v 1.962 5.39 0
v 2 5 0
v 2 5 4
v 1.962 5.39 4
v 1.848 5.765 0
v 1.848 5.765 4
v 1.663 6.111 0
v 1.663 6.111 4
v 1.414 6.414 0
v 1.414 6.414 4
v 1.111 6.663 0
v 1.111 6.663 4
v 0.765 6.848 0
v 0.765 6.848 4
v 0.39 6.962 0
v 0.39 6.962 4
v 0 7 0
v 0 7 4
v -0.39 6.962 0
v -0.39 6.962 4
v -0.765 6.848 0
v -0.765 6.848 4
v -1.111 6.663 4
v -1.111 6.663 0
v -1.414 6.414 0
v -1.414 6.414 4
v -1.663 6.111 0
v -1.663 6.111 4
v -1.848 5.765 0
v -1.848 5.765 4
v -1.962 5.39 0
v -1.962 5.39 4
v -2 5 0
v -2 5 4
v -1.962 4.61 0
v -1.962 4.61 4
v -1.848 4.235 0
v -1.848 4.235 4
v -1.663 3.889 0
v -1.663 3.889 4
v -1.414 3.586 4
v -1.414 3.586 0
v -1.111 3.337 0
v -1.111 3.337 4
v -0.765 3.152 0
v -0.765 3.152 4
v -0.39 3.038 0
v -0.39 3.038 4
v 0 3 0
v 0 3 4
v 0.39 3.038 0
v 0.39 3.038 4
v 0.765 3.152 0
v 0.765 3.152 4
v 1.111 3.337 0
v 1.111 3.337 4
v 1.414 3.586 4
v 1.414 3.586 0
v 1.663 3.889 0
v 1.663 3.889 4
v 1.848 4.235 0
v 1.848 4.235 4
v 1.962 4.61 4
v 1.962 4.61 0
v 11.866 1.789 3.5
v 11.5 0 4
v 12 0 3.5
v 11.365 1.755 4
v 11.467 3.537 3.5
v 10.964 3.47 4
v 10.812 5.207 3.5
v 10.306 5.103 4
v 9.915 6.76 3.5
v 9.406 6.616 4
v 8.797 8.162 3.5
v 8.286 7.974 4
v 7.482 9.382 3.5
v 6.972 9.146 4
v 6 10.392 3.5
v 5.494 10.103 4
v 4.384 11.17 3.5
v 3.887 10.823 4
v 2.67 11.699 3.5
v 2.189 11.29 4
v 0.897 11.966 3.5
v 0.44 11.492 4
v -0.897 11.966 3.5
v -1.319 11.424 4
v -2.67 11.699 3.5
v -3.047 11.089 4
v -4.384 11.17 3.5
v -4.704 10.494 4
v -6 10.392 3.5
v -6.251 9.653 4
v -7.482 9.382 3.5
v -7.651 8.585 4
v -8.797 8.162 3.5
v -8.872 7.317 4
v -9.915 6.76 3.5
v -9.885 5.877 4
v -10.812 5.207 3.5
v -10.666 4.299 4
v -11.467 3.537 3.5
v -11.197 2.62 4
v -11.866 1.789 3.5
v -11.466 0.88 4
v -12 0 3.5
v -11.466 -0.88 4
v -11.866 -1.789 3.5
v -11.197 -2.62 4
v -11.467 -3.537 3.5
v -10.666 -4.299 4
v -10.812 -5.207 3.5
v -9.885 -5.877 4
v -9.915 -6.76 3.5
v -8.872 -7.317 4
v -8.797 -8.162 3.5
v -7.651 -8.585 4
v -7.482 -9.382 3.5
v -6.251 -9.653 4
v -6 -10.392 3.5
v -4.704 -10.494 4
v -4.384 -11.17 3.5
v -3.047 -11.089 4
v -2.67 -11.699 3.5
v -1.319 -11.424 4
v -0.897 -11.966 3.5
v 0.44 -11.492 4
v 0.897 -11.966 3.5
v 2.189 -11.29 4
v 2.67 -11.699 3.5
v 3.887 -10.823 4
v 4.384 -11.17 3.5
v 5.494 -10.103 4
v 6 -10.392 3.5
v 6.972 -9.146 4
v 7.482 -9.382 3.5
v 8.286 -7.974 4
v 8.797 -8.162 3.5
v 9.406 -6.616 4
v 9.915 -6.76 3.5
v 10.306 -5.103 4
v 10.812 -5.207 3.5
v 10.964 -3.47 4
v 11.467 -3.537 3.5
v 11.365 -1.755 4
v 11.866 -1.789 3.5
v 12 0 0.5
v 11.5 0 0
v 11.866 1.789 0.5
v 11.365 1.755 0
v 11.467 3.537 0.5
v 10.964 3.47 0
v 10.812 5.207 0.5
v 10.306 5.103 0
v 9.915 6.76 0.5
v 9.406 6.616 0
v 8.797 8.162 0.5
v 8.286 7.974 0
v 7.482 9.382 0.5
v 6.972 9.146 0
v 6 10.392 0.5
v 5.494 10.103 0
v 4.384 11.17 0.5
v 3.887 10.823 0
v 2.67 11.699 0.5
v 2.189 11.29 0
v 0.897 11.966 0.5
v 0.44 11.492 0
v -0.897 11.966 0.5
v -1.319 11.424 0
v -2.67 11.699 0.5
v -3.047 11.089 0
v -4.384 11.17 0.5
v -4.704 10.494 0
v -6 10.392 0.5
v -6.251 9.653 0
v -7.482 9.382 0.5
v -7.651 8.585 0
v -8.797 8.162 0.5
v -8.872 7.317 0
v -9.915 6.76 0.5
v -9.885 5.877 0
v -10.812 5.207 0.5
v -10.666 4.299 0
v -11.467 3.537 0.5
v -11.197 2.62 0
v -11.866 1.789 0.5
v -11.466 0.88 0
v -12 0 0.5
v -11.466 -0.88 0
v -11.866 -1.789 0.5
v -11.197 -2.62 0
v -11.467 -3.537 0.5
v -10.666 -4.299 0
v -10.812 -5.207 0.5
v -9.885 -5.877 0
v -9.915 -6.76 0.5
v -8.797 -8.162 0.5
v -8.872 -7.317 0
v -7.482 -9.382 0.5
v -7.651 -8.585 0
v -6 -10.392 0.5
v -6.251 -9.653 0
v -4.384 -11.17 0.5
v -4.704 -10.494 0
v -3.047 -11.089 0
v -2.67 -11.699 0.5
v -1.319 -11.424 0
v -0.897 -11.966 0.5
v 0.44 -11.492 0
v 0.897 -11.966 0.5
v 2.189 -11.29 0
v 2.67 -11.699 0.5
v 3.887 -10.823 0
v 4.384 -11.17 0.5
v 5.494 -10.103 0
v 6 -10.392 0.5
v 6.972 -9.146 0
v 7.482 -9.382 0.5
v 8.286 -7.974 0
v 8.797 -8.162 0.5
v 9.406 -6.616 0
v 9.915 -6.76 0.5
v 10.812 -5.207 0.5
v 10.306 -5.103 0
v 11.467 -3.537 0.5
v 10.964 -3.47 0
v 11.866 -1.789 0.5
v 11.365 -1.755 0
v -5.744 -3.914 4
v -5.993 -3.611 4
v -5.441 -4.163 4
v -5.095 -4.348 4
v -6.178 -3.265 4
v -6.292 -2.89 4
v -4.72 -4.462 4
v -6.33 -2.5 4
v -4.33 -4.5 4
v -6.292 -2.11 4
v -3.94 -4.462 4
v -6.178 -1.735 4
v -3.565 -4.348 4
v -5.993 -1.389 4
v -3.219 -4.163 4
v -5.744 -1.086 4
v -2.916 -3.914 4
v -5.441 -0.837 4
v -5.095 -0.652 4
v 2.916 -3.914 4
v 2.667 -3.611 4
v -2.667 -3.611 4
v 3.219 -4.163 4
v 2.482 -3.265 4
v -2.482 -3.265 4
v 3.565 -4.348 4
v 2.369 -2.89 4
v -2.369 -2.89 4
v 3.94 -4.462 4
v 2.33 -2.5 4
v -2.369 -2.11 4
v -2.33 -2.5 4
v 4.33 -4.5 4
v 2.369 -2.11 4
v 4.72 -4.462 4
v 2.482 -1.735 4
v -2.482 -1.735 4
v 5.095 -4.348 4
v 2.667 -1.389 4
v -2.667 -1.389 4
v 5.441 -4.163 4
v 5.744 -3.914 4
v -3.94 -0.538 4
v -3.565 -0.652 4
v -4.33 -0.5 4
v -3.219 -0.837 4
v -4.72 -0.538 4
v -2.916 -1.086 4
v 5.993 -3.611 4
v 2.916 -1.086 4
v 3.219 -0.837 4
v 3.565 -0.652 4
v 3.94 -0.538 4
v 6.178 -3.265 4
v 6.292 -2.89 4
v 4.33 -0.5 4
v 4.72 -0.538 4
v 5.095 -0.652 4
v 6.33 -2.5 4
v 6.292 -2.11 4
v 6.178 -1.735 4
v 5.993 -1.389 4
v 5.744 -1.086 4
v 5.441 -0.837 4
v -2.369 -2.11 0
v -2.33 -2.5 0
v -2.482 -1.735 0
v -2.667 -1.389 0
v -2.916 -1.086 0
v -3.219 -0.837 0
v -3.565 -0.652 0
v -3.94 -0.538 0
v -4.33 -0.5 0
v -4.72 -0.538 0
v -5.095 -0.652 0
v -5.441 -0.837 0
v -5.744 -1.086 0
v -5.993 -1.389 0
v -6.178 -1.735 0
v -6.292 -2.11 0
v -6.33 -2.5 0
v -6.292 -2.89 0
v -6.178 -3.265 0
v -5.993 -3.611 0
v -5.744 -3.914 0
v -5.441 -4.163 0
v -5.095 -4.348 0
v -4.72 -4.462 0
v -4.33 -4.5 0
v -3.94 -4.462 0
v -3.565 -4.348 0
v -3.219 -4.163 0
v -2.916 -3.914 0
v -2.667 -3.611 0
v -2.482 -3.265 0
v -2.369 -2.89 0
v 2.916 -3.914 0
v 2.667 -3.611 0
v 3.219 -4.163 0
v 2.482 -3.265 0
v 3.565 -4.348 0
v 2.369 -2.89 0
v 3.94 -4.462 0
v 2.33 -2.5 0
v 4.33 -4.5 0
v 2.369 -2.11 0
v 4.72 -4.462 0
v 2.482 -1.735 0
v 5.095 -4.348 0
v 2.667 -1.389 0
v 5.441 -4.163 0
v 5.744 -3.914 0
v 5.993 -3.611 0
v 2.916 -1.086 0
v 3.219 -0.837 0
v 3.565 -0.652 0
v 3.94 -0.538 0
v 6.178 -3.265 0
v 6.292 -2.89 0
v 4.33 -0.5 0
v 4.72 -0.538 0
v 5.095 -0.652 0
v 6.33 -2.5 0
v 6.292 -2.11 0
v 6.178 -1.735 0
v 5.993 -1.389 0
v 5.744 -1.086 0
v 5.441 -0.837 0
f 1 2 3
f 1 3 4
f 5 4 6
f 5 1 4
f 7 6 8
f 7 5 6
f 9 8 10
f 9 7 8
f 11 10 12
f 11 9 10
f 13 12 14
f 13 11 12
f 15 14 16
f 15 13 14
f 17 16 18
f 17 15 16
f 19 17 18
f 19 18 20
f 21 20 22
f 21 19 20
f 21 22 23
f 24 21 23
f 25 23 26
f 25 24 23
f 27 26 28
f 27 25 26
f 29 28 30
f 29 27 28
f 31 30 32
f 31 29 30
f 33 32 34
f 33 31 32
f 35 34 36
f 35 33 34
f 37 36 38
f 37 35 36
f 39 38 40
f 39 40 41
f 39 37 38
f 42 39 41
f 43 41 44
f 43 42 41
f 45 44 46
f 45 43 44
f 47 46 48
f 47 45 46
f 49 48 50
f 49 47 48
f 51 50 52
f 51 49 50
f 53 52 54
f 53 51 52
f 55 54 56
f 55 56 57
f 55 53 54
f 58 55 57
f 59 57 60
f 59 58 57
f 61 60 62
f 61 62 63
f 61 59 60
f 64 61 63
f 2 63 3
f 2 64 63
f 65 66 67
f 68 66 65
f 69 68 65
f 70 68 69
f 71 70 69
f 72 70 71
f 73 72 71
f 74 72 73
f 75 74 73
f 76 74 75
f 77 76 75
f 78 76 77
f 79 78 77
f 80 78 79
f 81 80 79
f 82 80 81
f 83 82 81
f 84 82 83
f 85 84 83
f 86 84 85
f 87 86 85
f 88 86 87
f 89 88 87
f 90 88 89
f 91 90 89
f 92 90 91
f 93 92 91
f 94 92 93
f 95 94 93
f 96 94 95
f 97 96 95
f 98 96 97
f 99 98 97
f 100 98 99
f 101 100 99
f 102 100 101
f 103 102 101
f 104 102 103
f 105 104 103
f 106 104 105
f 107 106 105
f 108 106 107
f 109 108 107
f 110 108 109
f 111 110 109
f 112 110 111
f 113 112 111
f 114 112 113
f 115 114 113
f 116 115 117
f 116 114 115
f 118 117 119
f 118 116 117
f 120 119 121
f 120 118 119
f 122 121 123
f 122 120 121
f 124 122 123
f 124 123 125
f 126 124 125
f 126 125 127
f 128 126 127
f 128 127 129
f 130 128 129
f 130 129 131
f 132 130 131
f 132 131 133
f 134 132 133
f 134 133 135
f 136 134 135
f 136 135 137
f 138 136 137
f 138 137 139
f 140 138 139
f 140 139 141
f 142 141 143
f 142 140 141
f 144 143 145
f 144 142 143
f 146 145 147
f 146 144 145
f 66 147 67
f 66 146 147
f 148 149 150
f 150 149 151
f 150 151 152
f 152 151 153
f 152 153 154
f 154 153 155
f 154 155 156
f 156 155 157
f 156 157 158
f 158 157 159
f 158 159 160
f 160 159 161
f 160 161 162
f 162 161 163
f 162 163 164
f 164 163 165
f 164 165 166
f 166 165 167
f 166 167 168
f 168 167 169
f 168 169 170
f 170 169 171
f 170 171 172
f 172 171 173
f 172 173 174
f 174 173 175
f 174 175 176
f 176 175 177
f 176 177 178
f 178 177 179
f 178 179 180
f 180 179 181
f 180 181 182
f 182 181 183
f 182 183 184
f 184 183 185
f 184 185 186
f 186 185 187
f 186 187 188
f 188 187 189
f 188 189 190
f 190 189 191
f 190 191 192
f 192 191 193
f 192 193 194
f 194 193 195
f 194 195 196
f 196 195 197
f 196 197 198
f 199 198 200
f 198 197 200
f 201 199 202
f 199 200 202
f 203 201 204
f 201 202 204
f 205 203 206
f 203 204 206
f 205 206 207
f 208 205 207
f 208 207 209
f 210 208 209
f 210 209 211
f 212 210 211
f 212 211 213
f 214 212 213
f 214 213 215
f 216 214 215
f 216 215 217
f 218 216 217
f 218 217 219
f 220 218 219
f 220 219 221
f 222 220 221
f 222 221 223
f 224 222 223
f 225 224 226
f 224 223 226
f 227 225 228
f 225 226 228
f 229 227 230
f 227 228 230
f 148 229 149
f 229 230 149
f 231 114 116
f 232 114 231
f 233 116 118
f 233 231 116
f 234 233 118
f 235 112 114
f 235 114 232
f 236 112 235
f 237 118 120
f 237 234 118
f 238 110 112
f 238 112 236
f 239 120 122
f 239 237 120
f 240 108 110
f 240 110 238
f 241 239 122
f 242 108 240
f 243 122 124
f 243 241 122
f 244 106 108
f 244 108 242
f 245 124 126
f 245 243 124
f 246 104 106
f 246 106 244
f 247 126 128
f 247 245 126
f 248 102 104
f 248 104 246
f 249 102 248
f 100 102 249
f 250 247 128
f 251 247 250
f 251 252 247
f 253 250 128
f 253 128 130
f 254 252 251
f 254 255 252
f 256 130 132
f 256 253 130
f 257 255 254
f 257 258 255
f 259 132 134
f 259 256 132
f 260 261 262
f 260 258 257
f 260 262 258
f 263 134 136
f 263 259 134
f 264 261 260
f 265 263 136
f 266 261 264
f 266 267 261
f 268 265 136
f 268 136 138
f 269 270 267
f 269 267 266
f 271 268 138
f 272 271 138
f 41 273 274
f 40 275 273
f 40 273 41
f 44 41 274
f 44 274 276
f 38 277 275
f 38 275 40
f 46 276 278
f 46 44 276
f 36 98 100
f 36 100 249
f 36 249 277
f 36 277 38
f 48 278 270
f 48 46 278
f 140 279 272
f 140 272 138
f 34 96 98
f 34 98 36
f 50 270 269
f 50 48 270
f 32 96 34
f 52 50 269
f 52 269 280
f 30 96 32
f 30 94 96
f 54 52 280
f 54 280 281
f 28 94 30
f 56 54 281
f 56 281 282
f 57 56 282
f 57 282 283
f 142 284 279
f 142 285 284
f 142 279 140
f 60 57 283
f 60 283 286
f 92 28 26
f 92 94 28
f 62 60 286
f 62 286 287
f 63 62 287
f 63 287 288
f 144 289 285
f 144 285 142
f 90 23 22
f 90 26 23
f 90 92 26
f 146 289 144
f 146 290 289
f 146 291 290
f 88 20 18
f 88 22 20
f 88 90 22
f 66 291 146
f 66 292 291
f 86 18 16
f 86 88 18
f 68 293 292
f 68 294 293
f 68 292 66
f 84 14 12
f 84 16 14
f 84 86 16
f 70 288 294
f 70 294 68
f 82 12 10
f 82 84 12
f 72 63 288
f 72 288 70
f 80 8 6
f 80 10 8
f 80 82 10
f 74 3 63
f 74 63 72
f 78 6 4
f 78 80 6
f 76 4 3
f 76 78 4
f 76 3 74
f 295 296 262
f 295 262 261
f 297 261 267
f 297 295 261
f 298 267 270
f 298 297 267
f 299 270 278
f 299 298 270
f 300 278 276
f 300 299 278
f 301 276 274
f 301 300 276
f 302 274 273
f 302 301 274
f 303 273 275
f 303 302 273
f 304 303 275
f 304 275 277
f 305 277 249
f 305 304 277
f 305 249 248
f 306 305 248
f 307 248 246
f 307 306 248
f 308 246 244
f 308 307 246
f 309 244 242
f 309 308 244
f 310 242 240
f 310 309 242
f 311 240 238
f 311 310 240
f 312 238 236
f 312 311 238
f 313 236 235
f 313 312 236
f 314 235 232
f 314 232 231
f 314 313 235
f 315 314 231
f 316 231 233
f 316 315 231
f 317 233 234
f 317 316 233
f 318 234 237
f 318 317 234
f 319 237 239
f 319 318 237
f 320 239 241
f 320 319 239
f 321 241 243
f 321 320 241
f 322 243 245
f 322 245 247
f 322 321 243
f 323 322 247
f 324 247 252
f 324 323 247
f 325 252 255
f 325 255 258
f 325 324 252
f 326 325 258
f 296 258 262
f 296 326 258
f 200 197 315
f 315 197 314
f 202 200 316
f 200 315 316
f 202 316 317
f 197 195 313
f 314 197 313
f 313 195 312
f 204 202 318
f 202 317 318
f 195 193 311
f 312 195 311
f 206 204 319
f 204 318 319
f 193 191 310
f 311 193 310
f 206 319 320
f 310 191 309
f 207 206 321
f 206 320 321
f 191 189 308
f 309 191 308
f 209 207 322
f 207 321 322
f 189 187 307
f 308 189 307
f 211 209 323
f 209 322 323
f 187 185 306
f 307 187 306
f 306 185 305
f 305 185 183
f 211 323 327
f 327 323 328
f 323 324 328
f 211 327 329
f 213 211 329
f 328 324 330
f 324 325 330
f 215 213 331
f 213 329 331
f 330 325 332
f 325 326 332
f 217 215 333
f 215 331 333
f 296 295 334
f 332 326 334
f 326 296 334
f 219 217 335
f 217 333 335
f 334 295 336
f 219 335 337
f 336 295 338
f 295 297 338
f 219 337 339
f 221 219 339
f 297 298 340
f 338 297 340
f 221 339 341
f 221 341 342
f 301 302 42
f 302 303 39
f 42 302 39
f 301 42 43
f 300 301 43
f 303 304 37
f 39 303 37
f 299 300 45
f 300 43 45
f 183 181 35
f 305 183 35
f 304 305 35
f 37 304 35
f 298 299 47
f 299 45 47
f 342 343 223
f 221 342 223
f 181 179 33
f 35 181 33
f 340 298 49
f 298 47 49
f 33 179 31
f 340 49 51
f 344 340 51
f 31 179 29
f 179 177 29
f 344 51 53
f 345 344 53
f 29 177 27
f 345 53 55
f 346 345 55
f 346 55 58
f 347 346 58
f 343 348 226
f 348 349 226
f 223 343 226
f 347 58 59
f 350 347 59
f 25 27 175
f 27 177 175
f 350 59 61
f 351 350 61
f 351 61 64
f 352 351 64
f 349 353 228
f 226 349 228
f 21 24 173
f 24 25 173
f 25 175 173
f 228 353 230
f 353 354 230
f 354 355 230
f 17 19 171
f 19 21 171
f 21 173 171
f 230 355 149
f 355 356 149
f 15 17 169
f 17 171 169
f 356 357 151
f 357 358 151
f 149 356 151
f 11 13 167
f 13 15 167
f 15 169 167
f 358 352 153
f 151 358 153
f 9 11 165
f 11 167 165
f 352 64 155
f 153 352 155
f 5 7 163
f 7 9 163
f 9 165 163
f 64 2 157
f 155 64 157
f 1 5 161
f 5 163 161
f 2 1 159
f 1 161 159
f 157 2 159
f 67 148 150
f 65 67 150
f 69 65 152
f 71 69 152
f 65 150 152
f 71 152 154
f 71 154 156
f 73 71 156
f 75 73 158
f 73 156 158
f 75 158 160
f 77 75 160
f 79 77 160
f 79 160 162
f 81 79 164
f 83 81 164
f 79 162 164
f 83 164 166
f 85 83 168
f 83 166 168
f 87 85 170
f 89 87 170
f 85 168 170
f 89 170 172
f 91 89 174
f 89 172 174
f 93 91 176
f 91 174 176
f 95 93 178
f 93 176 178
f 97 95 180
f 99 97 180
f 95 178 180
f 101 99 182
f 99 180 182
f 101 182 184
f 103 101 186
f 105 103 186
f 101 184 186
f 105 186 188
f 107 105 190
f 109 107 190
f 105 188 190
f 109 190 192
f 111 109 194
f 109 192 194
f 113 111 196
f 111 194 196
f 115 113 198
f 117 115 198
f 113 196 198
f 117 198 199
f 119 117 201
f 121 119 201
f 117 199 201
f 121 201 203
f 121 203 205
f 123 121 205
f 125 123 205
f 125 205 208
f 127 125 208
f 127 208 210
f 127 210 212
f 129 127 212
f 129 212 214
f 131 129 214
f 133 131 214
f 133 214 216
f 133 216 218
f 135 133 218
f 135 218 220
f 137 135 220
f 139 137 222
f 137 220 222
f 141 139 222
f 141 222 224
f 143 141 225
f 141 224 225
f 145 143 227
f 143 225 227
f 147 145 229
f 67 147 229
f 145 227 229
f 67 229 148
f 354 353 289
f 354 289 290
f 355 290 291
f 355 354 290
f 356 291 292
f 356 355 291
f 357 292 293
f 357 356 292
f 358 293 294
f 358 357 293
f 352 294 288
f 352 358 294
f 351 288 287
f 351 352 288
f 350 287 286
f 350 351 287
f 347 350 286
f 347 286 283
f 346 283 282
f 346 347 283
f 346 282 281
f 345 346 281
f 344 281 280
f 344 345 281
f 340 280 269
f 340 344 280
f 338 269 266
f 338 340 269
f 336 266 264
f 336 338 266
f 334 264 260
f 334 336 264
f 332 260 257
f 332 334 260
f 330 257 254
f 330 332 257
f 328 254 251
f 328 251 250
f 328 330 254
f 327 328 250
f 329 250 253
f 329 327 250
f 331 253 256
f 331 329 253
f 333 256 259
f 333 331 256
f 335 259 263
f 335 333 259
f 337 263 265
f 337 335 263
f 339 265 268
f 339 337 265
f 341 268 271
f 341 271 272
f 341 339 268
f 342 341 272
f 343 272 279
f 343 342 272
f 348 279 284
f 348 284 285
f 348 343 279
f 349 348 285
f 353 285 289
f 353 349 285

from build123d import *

# Parameters (mm, degrees)
SKETCH_1_R      = 12
SKETCH_1_R_2    = 2
EXTRUDE_1_DEPTH = 4
CHAMFER_1_SIZE  = 0.5


with BuildPart() as part:
    # 草图1 → 凸台-拉伸1 (new body)
    with BuildSketch(Plane.XY):
        Circle(SKETCH_1_R)
        with Locations((0, 5)):
            Circle(SKETCH_1_R_2, mode=Mode.SUBTRACT)
        with Locations((4.330127019, -2.5)):
            Circle(SKETCH_1_R_2, mode=Mode.SUBTRACT)
        with Locations((-4.330127019, -2.5)):
            Circle(SKETCH_1_R_2, mode=Mode.SUBTRACT)
    extrude(amount=EXTRUDE_1_DEPTH)

    # 倒角1
    chamfer_1_edges = [part.edges().sort_by_distance(p)[0] for p in [
        (-12, 0, 0),
        (-12, 0, 4),
    ]]
    chamfer(chamfer_1_edges, length=CHAMFER_1_SIZE)


solid = part.part
